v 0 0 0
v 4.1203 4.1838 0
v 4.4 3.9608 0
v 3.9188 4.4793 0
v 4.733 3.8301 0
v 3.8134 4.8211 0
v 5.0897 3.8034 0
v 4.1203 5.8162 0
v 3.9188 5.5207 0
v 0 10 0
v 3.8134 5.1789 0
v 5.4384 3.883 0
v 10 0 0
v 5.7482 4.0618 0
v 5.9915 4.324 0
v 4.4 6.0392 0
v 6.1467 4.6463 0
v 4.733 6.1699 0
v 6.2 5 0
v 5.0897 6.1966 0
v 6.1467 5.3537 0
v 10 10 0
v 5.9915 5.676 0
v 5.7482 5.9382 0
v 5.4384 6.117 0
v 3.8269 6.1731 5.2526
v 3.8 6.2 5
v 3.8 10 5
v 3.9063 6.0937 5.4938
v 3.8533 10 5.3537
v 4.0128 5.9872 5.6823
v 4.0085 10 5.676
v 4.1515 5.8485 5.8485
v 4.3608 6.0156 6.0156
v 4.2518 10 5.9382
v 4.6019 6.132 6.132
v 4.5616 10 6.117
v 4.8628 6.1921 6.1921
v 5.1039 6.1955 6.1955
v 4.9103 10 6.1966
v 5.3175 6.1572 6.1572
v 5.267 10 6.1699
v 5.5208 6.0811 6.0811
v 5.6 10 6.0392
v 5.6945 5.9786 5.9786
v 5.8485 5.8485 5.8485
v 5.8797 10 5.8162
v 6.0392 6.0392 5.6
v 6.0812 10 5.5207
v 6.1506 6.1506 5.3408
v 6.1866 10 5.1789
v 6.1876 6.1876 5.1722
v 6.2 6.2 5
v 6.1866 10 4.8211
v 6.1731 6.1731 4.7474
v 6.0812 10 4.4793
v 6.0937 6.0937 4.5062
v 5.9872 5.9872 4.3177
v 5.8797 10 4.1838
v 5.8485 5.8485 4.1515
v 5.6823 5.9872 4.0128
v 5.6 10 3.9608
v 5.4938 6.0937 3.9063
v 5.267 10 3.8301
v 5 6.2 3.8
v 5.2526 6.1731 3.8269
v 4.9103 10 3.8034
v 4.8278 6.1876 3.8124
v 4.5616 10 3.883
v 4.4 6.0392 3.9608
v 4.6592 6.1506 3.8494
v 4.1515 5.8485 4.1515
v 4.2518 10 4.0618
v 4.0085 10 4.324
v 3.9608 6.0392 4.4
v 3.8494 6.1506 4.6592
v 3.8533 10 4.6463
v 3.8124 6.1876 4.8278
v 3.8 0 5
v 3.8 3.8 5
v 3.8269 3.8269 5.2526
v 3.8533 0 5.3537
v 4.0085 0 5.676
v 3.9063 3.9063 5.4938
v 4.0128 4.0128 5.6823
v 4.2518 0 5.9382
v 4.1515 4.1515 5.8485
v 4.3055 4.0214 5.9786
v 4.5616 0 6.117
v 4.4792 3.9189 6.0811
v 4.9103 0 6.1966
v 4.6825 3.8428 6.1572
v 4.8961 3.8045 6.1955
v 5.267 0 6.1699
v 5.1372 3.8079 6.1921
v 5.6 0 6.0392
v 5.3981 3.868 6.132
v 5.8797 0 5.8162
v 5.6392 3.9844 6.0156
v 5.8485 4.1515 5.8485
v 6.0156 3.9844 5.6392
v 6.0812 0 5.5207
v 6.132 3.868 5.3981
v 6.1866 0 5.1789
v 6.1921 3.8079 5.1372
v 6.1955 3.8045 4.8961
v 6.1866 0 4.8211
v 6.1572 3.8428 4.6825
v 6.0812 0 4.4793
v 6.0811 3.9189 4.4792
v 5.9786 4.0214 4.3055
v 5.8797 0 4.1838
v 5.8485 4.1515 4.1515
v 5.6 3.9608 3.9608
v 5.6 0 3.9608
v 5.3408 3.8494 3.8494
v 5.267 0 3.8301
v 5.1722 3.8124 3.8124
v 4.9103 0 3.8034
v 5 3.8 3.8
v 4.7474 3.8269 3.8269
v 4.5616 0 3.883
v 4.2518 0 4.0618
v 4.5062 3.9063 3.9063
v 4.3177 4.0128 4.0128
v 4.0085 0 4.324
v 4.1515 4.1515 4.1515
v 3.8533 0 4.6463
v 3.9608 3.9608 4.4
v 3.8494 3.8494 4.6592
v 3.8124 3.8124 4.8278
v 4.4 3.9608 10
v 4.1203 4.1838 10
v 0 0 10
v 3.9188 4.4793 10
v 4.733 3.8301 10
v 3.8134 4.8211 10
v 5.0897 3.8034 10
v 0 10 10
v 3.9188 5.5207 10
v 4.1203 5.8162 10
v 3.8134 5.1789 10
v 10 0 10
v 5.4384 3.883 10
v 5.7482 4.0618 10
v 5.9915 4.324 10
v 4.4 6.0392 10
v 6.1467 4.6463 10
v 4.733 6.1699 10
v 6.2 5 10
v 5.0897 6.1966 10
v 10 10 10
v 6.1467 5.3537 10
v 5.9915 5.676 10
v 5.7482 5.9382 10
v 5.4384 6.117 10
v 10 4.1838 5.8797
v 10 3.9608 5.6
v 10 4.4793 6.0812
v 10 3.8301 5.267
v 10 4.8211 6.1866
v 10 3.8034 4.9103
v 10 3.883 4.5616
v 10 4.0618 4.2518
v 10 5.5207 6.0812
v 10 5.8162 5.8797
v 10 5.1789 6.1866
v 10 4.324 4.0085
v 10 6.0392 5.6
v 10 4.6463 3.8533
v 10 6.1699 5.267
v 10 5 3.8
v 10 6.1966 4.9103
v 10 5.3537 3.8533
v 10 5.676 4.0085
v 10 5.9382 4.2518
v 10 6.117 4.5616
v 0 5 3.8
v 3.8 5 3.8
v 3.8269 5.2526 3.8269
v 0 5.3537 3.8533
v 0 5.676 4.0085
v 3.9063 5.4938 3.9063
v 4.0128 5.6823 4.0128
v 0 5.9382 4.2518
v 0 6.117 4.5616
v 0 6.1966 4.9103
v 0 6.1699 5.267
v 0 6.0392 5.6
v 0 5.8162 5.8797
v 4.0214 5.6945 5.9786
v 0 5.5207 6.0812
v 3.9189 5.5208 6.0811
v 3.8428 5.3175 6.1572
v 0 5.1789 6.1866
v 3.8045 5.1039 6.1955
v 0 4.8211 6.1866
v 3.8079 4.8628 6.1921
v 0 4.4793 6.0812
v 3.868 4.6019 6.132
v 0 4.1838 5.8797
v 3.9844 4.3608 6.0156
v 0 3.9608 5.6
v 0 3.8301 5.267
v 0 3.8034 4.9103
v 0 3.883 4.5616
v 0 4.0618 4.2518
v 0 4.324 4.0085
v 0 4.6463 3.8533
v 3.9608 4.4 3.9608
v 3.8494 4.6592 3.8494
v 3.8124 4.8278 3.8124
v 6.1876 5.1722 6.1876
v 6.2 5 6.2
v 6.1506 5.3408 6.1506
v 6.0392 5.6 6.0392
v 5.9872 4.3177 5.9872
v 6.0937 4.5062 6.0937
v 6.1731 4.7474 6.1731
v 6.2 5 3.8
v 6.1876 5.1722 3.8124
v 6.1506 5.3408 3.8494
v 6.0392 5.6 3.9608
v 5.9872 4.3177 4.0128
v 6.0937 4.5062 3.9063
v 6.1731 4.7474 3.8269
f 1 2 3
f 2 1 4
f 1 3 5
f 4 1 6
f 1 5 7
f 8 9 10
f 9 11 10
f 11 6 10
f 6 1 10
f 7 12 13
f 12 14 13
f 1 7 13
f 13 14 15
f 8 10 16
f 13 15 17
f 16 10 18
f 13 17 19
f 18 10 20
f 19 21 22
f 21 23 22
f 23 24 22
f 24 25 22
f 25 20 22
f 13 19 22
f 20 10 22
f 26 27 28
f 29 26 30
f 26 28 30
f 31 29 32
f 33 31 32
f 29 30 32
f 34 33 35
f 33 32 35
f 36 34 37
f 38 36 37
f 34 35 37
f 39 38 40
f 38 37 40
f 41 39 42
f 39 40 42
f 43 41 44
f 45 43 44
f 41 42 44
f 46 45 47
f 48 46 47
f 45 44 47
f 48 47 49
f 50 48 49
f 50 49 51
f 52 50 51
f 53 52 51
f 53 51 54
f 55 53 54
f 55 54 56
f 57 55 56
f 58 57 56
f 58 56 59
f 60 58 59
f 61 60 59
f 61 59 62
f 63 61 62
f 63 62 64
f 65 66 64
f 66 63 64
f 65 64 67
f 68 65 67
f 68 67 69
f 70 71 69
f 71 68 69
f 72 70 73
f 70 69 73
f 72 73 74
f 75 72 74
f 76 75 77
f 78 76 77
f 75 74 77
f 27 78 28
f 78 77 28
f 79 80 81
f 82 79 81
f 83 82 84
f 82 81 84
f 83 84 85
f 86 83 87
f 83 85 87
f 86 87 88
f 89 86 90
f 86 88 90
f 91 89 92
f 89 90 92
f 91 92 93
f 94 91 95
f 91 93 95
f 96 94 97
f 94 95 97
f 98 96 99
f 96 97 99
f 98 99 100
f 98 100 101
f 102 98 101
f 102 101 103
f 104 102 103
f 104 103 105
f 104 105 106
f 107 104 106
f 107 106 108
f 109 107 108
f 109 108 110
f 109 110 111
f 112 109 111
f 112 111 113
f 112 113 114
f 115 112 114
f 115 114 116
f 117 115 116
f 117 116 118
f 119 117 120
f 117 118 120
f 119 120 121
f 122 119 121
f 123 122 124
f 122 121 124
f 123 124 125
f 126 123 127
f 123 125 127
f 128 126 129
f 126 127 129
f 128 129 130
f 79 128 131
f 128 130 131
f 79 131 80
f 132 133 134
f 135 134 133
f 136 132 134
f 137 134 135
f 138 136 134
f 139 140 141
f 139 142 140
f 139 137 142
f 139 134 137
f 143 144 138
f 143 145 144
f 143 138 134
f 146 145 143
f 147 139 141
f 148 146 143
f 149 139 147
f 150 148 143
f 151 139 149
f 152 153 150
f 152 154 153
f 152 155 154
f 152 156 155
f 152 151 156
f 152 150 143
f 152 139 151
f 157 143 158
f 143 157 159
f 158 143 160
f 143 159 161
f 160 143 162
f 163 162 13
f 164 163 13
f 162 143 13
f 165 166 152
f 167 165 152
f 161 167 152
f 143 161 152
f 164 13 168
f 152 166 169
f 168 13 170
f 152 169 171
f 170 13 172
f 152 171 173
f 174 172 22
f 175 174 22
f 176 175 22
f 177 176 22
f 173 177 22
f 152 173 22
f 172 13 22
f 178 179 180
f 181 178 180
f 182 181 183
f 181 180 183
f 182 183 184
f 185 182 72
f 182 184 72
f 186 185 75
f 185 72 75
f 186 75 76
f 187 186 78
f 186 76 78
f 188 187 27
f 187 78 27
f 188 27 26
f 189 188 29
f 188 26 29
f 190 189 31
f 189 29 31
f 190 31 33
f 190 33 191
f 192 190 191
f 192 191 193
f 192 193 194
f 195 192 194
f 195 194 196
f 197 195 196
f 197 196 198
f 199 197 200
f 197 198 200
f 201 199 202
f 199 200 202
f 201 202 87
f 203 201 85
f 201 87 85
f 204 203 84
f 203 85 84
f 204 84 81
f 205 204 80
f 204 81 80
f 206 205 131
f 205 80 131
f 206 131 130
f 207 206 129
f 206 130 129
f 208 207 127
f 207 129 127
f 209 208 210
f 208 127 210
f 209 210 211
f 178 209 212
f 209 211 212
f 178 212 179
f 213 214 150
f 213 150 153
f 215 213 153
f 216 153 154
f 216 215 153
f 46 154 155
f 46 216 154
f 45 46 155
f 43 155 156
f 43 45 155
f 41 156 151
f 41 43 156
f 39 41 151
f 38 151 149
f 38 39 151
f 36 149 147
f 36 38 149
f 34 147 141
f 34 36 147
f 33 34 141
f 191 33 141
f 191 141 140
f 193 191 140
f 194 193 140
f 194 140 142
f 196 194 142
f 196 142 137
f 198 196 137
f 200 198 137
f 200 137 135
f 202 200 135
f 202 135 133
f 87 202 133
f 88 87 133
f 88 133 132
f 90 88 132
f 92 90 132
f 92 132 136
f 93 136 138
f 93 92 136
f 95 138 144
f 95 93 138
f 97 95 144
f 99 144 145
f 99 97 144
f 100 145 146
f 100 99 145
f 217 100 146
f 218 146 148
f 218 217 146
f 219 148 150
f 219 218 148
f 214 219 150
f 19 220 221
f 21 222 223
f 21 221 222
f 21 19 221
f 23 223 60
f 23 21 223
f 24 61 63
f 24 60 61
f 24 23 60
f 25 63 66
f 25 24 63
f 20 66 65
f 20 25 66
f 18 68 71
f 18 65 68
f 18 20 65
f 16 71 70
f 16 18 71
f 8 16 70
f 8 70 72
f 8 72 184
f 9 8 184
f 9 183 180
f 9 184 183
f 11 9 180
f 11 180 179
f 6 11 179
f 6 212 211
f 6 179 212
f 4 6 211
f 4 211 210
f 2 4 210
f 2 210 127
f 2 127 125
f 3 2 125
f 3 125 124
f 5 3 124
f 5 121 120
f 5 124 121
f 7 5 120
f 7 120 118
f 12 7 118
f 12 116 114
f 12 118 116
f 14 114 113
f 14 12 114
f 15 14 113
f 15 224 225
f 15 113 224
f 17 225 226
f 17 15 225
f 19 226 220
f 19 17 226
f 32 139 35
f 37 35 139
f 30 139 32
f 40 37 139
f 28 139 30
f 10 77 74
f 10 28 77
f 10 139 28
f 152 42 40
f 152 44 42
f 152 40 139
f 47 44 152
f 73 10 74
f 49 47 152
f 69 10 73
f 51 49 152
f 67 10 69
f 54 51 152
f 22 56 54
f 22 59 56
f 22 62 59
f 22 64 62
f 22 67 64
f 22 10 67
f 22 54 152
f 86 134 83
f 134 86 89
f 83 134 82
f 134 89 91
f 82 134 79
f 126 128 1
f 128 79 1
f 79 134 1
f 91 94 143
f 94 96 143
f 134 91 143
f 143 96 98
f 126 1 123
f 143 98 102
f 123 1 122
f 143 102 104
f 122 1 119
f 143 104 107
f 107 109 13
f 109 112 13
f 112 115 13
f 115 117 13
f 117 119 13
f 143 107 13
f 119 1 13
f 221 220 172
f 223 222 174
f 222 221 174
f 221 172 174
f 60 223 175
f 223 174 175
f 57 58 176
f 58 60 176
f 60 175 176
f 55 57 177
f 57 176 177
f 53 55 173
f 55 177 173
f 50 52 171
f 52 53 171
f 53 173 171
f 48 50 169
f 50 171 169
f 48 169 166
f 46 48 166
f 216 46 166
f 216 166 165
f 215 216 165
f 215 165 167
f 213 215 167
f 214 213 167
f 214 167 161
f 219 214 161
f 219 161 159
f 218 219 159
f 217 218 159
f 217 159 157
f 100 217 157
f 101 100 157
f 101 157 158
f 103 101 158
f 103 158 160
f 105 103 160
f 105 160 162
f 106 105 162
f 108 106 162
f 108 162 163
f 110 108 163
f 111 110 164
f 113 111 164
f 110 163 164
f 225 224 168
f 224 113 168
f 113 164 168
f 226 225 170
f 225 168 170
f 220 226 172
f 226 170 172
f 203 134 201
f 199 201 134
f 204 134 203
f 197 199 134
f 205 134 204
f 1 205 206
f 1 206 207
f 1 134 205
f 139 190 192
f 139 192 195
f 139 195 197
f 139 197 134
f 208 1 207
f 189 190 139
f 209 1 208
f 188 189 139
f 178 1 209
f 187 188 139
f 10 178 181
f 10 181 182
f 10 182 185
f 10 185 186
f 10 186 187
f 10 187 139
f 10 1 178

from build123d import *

# Parameters (mm, degrees)
SKETCH_1_W          = 10
SKETCH_1_H          = 10
SKETCH_1_R          = 1.2
EXTRUDE_1_DEPTH     = 10
SKETCH_2_R          = 1.2
CUT_EXTRUDE_1_DEPTH = 18.320508076
SKETCH_3_R          = 1.2
CUT_EXTRUDE_2_DEPTH = 10


with BuildPart() as part:
    # 草图1 → 凸台-拉伸1 (new body)
    with BuildSketch(Plane.XY):
        with Locations((5, 5)):
            Rectangle(SKETCH_1_W, SKETCH_1_H)
        with Locations((5, 5)):
            Circle(SKETCH_1_R, mode=Mode.SUBTRACT)
    extrude(amount=EXTRUDE_1_DEPTH)

    # 草图2 → 切除-拉伸1 (cut, through all)
    with BuildSketch(Plane(origin=(0, 10, 0), x_dir=(1, 0, 0), z_dir=(0, 1, 0))):
        with Locations(Location((5, -5, 0), (0, 0, 180))):
            Circle(SKETCH_2_R)
    extrude(amount=-CUT_EXTRUDE_1_DEPTH, mode=Mode.SUBTRACT)

    # 草图3 → 切除-拉伸2 (cut)
    with BuildSketch(Plane(origin=(10, 0, 0), x_dir=(0, 0, -1), z_dir=(1, 0, 0))):
        with Locations((-5, 5)):
            Circle(SKETCH_3_R)
    extrude(amount=-CUT_EXTRUDE_2_DEPTH, mode=Mode.SUBTRACT)


solid = part.part
